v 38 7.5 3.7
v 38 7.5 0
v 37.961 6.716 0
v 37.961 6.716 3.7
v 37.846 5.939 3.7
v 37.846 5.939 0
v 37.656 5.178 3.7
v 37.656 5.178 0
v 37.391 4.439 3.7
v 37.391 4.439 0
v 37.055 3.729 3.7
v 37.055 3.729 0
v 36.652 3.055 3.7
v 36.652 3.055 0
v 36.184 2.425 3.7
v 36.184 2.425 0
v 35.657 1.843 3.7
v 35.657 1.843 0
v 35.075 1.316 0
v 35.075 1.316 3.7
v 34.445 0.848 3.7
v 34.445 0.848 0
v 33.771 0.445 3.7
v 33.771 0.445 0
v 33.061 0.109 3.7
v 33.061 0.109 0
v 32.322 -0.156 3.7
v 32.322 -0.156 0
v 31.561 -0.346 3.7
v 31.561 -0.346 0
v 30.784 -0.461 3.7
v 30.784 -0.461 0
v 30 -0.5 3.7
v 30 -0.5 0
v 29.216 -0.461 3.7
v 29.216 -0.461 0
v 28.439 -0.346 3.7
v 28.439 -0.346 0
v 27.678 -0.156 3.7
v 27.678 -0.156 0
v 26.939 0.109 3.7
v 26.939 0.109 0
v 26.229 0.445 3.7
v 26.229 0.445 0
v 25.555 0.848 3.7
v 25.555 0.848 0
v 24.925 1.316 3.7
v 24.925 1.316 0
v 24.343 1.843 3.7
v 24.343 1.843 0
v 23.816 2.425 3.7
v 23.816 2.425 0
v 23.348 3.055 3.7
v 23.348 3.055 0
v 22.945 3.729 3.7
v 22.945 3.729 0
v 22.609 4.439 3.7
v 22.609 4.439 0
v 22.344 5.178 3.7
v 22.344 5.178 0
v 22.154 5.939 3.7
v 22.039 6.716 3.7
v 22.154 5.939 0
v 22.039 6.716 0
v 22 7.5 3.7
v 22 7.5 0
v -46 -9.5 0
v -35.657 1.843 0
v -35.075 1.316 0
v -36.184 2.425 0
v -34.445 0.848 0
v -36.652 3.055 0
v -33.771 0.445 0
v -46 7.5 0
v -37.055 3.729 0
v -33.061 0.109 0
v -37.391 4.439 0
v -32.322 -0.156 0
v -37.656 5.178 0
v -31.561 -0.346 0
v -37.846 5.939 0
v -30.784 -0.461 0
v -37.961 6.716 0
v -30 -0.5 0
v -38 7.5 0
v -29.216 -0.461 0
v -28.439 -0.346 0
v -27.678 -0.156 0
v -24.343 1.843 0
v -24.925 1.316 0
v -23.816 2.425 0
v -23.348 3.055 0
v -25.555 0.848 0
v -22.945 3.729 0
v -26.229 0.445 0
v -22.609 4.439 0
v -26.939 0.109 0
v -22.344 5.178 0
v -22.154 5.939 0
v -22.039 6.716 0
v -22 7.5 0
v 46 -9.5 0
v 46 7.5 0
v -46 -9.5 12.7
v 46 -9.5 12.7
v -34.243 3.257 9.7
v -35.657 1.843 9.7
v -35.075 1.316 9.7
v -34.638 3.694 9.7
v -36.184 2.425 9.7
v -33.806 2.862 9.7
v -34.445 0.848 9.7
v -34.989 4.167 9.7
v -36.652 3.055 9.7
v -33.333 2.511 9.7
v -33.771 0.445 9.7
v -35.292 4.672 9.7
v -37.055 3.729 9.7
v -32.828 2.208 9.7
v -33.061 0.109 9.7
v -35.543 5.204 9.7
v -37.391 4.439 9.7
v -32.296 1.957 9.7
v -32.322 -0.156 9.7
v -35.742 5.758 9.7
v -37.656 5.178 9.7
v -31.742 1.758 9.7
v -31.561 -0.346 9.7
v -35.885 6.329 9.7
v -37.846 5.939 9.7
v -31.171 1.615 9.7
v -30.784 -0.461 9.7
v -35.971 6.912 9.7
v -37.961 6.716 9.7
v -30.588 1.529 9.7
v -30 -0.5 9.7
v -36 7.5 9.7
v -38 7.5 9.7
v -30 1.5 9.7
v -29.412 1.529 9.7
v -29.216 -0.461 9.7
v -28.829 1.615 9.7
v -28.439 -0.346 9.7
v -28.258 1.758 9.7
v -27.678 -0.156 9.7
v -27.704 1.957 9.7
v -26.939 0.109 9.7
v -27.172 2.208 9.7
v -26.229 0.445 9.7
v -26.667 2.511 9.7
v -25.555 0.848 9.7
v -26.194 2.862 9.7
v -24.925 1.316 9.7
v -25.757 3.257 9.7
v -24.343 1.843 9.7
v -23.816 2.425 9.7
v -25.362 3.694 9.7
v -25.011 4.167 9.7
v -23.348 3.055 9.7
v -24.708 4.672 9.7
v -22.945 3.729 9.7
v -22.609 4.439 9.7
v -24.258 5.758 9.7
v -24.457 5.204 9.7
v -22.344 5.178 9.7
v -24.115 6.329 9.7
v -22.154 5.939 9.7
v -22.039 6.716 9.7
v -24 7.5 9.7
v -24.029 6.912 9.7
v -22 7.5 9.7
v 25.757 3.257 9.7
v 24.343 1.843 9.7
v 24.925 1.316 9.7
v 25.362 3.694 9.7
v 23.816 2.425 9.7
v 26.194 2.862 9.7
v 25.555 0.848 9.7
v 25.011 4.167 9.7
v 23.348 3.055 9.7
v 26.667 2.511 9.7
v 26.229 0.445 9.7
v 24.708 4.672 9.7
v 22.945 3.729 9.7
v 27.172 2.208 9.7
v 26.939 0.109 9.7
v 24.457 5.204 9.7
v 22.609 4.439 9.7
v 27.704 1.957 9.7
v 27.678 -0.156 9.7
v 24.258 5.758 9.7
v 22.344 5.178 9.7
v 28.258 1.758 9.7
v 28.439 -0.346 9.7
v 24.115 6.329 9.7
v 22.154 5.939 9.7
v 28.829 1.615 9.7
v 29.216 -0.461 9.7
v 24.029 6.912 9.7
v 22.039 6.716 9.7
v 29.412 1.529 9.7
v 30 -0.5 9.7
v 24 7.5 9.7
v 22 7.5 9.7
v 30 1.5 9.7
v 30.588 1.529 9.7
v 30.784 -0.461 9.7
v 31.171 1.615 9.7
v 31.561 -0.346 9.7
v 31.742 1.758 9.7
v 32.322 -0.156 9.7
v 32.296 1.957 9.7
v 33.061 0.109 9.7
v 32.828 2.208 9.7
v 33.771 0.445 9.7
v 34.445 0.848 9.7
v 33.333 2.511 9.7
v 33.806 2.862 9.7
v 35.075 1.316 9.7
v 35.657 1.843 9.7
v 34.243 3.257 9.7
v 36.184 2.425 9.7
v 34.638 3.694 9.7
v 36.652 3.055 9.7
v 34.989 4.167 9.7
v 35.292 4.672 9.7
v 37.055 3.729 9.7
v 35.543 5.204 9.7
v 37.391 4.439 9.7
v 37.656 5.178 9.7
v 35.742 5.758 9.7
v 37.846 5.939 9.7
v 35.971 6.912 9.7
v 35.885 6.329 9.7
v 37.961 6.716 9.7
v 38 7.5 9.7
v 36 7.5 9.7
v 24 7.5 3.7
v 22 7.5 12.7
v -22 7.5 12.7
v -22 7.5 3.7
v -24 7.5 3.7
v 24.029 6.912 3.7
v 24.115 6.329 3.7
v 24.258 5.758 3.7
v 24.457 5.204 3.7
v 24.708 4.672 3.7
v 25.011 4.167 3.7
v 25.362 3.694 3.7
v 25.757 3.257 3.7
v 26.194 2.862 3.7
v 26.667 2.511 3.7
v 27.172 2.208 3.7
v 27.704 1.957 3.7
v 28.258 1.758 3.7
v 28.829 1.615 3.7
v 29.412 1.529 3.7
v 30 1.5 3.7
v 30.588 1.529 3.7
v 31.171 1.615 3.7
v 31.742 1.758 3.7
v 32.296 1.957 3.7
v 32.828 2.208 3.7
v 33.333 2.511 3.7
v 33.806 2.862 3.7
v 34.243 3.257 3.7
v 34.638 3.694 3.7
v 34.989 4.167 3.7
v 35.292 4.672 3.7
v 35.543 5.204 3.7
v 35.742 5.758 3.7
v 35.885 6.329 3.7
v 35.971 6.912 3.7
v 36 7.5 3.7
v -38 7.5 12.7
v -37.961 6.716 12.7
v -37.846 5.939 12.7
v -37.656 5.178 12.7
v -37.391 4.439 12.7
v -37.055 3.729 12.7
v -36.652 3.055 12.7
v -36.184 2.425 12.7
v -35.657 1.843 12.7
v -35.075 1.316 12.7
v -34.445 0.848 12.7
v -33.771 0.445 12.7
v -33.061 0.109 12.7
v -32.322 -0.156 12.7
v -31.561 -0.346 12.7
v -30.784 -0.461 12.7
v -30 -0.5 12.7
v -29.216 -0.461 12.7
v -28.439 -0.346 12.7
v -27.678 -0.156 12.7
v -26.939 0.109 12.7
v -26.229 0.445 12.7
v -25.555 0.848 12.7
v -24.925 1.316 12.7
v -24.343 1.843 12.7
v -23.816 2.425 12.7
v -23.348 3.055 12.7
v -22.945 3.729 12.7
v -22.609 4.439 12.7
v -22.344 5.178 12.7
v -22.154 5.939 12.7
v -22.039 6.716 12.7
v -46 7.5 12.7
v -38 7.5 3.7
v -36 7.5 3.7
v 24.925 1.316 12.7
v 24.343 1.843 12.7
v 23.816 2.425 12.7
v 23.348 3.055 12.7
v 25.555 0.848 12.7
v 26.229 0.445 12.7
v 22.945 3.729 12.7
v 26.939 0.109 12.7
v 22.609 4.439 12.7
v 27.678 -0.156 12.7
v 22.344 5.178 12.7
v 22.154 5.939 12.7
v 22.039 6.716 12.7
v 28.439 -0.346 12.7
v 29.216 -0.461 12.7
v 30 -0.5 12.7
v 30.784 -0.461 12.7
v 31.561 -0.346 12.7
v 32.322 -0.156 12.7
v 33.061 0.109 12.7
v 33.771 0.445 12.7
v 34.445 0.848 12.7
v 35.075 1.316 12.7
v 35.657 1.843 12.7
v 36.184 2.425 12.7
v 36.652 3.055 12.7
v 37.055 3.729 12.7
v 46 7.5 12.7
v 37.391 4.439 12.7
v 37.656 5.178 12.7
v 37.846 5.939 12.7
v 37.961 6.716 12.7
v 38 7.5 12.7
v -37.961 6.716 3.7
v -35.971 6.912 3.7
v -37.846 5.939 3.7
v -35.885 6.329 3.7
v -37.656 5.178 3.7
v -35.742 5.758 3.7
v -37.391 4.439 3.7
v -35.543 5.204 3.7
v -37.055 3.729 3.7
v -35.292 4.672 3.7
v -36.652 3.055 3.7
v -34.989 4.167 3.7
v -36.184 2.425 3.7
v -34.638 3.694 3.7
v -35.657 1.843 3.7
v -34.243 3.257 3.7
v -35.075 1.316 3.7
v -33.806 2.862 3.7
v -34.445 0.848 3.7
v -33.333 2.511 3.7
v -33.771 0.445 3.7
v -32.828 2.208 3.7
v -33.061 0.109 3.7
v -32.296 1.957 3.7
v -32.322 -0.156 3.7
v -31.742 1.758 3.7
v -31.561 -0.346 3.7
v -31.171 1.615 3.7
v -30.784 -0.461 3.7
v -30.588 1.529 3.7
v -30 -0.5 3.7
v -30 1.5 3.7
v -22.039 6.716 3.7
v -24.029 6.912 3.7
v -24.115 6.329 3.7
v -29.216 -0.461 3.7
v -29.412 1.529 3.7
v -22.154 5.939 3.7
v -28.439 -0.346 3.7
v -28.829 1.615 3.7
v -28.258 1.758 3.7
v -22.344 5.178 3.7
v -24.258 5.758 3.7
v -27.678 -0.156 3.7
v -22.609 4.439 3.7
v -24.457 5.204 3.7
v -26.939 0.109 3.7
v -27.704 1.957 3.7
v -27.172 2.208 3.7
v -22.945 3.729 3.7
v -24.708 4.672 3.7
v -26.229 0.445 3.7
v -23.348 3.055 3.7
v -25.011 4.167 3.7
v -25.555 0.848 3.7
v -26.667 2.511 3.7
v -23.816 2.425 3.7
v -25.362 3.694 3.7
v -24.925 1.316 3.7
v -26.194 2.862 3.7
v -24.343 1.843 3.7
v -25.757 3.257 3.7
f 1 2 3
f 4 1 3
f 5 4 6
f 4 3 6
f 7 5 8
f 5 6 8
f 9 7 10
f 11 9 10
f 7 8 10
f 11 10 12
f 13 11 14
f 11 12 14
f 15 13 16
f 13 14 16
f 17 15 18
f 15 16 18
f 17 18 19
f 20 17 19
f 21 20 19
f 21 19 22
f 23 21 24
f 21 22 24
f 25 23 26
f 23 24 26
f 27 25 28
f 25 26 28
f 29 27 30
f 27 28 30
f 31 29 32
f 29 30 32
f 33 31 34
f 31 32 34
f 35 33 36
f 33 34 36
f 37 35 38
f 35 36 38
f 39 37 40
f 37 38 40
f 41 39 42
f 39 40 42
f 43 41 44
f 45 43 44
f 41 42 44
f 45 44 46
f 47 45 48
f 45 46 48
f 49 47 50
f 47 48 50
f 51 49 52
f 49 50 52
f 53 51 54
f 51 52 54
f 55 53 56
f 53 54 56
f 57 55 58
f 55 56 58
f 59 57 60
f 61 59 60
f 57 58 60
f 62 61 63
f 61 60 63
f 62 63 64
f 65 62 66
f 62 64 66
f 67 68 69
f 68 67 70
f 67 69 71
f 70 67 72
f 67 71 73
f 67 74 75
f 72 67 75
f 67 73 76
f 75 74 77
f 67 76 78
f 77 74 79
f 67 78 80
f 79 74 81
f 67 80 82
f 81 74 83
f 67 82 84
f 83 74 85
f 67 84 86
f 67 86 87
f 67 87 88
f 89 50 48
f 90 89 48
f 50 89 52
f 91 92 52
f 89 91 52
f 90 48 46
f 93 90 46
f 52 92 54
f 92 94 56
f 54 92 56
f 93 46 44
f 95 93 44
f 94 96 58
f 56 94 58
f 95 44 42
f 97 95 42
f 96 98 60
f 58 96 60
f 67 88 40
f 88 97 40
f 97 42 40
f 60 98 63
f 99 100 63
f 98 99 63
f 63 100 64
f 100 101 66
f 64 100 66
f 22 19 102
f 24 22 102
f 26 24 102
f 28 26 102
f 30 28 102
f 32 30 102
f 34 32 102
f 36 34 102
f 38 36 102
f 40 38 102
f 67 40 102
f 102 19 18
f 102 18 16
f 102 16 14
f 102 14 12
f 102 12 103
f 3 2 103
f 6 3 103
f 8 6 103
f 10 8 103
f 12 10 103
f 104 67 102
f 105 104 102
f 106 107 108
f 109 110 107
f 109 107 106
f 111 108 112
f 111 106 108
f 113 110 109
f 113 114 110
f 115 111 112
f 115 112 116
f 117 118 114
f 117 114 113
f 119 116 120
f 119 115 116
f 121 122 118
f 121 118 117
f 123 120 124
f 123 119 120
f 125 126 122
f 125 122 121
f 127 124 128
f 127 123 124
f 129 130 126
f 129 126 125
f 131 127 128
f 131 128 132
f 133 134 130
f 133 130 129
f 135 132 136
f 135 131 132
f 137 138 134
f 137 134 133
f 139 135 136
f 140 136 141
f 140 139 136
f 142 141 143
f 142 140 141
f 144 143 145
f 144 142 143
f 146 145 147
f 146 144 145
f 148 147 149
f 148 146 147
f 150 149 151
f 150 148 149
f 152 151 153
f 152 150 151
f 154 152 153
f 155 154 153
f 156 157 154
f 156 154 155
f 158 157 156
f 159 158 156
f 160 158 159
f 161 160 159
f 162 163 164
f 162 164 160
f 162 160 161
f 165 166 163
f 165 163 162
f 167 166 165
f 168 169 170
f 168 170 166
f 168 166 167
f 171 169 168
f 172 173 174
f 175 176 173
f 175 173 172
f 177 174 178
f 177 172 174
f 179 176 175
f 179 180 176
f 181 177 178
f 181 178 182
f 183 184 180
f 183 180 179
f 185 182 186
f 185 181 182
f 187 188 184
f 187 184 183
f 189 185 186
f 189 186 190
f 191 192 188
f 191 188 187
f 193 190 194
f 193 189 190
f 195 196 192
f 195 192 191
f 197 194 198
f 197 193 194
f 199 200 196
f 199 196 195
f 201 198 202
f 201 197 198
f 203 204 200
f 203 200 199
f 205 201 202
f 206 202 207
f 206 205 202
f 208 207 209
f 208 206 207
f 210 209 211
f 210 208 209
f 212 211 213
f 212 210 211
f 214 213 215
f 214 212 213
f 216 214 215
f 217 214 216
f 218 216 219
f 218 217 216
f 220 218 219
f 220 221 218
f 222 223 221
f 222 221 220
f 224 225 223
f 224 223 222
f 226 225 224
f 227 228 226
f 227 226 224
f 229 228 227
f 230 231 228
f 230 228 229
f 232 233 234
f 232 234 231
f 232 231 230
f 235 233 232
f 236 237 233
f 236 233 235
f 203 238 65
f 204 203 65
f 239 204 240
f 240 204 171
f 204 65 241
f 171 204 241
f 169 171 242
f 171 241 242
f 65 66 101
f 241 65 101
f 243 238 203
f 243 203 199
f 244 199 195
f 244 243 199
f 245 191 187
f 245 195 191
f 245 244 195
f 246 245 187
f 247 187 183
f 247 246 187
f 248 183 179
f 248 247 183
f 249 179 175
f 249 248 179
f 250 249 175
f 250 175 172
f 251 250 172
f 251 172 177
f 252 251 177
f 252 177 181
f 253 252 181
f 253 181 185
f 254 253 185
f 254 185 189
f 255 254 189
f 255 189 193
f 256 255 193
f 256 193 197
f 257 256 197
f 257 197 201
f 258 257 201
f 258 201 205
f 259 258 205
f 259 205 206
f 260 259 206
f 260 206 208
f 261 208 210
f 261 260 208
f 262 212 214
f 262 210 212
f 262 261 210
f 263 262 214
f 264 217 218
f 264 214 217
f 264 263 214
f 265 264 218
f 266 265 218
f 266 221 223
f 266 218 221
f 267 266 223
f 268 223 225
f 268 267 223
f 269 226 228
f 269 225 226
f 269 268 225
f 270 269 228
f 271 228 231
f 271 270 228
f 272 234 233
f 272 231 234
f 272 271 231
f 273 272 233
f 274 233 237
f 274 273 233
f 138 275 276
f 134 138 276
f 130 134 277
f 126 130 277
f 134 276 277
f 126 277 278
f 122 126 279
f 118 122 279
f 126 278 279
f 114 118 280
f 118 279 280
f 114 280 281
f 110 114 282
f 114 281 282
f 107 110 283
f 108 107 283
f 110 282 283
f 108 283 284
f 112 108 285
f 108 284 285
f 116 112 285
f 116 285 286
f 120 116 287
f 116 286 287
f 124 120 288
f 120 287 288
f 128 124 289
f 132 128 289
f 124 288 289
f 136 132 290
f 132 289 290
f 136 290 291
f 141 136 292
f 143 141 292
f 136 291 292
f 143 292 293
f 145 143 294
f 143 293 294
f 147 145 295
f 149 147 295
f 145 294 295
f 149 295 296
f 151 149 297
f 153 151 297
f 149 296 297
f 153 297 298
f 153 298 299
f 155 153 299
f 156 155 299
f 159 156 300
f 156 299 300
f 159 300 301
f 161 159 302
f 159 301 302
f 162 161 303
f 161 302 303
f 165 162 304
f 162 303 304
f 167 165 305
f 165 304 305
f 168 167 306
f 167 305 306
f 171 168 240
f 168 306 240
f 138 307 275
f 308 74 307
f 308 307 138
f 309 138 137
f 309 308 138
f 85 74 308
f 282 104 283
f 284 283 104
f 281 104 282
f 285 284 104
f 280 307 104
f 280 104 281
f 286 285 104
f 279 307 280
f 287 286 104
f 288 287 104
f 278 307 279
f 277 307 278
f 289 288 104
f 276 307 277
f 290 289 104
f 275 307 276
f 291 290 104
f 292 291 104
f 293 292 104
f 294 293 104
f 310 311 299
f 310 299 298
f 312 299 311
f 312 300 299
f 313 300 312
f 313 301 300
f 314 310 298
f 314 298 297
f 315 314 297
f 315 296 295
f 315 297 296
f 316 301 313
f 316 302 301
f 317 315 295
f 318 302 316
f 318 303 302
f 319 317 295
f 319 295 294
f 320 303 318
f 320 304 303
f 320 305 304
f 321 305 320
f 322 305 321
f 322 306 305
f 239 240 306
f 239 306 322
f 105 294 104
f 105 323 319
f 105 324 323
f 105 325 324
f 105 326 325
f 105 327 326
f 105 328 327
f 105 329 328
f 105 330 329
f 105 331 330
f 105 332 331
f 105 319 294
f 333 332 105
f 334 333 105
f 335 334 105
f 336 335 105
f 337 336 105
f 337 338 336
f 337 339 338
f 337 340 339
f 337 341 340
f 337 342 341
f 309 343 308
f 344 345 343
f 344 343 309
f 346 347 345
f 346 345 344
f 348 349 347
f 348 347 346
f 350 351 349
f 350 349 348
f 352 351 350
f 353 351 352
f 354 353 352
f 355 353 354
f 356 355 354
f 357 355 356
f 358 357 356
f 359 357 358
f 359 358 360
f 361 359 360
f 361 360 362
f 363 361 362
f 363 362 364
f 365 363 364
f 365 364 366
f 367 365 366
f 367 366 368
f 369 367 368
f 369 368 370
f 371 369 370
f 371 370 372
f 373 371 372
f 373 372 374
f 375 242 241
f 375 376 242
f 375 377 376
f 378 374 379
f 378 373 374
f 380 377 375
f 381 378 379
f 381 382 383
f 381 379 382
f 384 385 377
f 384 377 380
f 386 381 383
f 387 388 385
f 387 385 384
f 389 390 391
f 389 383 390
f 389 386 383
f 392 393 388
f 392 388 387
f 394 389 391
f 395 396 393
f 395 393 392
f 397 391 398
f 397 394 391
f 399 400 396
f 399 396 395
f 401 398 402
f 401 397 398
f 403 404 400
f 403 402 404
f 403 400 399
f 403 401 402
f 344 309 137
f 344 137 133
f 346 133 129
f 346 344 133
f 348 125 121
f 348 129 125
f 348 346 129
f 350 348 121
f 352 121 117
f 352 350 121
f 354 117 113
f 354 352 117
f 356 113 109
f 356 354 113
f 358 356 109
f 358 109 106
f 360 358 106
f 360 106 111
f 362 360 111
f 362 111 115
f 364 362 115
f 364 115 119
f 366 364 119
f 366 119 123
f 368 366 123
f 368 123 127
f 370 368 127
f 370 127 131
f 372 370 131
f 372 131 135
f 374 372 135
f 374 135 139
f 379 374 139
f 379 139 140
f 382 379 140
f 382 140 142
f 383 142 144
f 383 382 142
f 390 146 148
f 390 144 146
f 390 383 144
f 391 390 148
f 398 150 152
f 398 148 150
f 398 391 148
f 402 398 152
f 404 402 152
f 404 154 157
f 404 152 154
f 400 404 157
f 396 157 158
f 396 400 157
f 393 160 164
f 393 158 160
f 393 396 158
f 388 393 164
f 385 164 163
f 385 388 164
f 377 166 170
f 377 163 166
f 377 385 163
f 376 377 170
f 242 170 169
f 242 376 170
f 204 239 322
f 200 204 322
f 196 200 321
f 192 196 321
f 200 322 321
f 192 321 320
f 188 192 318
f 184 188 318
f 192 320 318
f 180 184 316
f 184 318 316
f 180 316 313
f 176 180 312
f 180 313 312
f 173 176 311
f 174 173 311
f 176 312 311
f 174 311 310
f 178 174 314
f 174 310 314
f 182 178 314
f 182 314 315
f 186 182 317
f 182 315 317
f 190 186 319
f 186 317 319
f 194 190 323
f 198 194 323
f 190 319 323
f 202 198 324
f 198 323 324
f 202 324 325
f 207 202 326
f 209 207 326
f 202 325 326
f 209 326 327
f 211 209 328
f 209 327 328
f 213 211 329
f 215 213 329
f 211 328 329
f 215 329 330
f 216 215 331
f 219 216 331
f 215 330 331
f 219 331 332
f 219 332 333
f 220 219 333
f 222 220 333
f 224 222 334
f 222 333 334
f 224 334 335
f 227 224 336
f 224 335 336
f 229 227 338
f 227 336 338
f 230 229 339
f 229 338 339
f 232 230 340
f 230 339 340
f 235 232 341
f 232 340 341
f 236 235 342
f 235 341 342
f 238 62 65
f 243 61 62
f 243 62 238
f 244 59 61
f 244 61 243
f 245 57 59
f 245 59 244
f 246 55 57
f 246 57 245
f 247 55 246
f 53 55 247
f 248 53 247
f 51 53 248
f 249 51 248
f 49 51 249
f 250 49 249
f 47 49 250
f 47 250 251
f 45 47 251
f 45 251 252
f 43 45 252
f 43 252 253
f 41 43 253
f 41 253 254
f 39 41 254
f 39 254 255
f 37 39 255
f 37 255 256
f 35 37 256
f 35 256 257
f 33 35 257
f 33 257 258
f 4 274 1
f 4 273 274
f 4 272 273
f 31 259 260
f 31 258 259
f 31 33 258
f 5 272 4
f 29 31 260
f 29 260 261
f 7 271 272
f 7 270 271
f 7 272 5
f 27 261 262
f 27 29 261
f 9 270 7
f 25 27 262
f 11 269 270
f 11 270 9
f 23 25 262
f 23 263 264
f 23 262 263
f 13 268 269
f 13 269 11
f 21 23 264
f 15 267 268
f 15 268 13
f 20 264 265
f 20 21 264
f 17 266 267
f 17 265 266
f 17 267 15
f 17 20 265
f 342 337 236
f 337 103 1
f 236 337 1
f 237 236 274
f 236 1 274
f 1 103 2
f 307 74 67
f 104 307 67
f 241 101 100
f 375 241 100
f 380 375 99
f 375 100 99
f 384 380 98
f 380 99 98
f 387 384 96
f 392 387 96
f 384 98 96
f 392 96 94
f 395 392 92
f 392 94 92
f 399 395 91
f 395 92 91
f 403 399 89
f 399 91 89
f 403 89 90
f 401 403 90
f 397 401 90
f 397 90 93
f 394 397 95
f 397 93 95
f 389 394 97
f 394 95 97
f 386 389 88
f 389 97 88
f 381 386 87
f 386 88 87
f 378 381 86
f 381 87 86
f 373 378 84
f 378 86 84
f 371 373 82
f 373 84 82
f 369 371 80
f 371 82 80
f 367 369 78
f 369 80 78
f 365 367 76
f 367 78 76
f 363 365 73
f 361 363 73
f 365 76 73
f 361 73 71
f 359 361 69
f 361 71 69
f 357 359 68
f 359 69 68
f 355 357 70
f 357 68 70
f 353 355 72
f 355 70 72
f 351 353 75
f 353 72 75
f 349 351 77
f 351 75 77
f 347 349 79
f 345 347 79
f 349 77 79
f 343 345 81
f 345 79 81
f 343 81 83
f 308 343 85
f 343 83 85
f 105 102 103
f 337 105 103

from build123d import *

# Parameters (mm, degrees)
PAD_DEPTH       = 12.7
POCKET_DEPTH    = 3
POCKET001_DEPTH = 3.7


with BuildPart() as part:
    # Sketch → Pad (new body)
    with BuildSketch(Plane.XY):
        with BuildLine():
            Line((-46, 7.5), (-46, -9.5))
            Line((-46, -9.5), (46, -9.5))
            Line((46, -9.5), (46, 7.5))
            Line((46, 7.5), (36, 7.5))
            ThreePointArc((24, 7.5), (30, 1.5), (36, 7.5))
            Line((24, 7.5), (-24, 7.5))
            ThreePointArc((-36, 7.5), (-30, 1.5), (-24, 7.5))
            Line((-46, 7.5), (-36, 7.5))
        make_face()
    extrude(amount=PAD_DEPTH)

    # Sketch001 → Pocket (cut)
    with BuildSketch(Plane.XY.offset(12.7)):
        with BuildLine():
            ThreePointArc((-38, 7.5), (-30, -0.5), (-22, 7.5))
            Line((-22, 23.5), (-22, 7.5))
            Line((-38, 23.5), (-22, 23.5))
            Line((-38, 7.5), (-38, 23.5))
        make_face()
        with BuildLine():
            ThreePointArc((22, 7.5), (30, -0.5), (38, 7.5))
            Line((38, 23.5), (38, 7.5))
            Line((22, 23.5), (38, 23.5))
            Line((22, 7.5), (22, 23.5))
        make_face()
    extrude(amount=-POCKET_DEPTH, mode=Mode.SUBTRACT)

    # Sketch002 → Pocket001 (cut)
    with BuildSketch(Plane(origin=(0, 0, 0), x_dir=(1, 0, 0), z_dir=(0, 0, -1))):
        with BuildLine():
            ThreePointArc((-22, -7.5), (-30, 0.5), (-38, -7.5))
            Line((-38, -7.5), (-38, -23.5))
            Line((-38, -23.5), (-22, -23.5))
            Line((-22, -23.5), (-22, -7.5))
        make_face()
        with BuildLine():
            ThreePointArc((38, -7.5), (30, 0.5), (22, -7.5))
            Line((22, -7.5), (22, -23.5))
            Line((22, -23.5), (38, -23.5))
            Line((38, -23.5), (38, -7.5))
        make_face()
    extrude(amount=-POCKET001_DEPTH, mode=Mode.SUBTRACT)


solid = part.part
